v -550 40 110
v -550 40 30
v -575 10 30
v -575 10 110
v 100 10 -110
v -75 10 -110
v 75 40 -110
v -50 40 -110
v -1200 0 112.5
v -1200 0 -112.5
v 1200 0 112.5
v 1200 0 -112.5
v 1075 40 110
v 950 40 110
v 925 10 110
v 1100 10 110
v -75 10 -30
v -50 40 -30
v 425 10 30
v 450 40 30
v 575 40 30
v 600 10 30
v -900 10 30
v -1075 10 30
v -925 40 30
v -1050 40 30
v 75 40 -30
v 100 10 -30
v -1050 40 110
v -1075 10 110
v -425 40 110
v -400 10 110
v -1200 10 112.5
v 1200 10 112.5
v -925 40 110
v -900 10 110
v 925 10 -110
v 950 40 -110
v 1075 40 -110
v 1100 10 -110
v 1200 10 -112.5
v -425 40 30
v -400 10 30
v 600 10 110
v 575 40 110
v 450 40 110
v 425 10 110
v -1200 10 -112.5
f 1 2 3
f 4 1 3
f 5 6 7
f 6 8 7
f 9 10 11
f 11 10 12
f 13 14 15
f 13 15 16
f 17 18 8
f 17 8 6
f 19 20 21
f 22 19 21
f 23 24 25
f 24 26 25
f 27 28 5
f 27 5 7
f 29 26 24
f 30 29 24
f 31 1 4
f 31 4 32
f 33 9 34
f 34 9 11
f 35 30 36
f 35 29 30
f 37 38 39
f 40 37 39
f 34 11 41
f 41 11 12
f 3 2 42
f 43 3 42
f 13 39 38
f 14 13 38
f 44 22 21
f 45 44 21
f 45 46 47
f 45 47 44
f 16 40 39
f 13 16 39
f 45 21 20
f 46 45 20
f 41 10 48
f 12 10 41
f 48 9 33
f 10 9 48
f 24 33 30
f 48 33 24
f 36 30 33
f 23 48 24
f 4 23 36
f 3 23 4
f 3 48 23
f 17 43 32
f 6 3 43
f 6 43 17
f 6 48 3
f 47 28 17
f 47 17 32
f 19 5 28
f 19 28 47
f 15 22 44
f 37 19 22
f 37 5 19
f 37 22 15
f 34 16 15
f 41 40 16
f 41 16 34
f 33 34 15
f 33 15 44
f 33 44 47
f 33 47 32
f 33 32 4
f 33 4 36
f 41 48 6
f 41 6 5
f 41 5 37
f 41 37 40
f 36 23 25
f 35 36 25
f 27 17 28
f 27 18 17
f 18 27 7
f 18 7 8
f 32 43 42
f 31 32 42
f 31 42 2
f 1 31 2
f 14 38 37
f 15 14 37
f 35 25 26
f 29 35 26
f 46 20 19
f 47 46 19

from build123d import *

# Parameters (mm, degrees)
SKETCH1_W                = 2400
SKETCH1_H                = 225
BOSS_EXTRUDE1_DEPTH      = 10
BOSS_EXTRUDE3_START      = 30
BOSS_EXTRUDE3_DEPTH      = 80
BOSS_EXTRUDE5_START      = 30
BOSS_EXTRUDE5_DEPTH      = 80
BOSS_EXTRUDE6_START      = -30
BOSS_EXTRUDE6_DEPTH      = 80
BOSS_EXTRUDE7_START      = 30
BOSS_EXTRUDE7_DEPTH      = 80
BOSS_EXTRUDE8_DEPTH      = 80
BOSS_EXTRUDE8_DEPTH_BACK = 140
BOSS_EXTRUDE8_START      = 30


with BuildPart() as part:
    # Sketch1 → Boss-Extrude1 (new body)
    with BuildSketch(Plane(origin=(0, 0, 0), x_dir=(1, 0, 0), z_dir=(0, 1, 0))):
        Rectangle(SKETCH1_W, SKETCH1_H)
    extrude(amount=BOSS_EXTRUDE1_DEPTH)

    # Sketch4 → Boss-Extrude3 (add)
    with BuildSketch(Plane.XY.offset(BOSS_EXTRUDE3_START)):
        Polygon((-1075, 10), (-900, 10), (-925, 40), (-1050, 40), align=None)
    extrude(amount=BOSS_EXTRUDE3_DEPTH)

    # Sketch6 → Boss-Extrude5 (add)
    with BuildSketch(Plane.XY.offset(BOSS_EXTRUDE5_START)):
        Polygon((-550, 40), (-575, 10), (-400, 10), (-425, 40), align=None)
    extrude(amount=BOSS_EXTRUDE5_DEPTH)

    # Sketch5 → Boss-Extrude6 (add)
    with BuildSketch(Plane.XY.offset(BOSS_EXTRUDE6_START)):
        Polygon((-75, 10), (100, 10), (75, 40), (-50, 40), align=None)
    extrude(amount=-BOSS_EXTRUDE6_DEPTH)

    # Sketch7 → Boss-Extrude7 (add)
    with BuildSketch(Plane.XY.offset(BOSS_EXTRUDE7_START)):
        Polygon((575, 40), (450, 40), (425, 10), (600, 10), align=None)
    extrude(amount=BOSS_EXTRUDE7_DEPTH)

    # Sketch8 → Boss-Extrude8 (add, two sides: drawn at the far end of the back side and taken through both)
    with BuildSketch(Plane.XY.offset(BOSS_EXTRUDE8_START - BOSS_EXTRUDE8_DEPTH_BACK)):
        Polygon((1075, 40), (950, 40), (925, 10), (1100, 10), align=None)
    extrude(amount=BOSS_EXTRUDE8_DEPTH + BOSS_EXTRUDE8_DEPTH_BACK)


solid = part.part
